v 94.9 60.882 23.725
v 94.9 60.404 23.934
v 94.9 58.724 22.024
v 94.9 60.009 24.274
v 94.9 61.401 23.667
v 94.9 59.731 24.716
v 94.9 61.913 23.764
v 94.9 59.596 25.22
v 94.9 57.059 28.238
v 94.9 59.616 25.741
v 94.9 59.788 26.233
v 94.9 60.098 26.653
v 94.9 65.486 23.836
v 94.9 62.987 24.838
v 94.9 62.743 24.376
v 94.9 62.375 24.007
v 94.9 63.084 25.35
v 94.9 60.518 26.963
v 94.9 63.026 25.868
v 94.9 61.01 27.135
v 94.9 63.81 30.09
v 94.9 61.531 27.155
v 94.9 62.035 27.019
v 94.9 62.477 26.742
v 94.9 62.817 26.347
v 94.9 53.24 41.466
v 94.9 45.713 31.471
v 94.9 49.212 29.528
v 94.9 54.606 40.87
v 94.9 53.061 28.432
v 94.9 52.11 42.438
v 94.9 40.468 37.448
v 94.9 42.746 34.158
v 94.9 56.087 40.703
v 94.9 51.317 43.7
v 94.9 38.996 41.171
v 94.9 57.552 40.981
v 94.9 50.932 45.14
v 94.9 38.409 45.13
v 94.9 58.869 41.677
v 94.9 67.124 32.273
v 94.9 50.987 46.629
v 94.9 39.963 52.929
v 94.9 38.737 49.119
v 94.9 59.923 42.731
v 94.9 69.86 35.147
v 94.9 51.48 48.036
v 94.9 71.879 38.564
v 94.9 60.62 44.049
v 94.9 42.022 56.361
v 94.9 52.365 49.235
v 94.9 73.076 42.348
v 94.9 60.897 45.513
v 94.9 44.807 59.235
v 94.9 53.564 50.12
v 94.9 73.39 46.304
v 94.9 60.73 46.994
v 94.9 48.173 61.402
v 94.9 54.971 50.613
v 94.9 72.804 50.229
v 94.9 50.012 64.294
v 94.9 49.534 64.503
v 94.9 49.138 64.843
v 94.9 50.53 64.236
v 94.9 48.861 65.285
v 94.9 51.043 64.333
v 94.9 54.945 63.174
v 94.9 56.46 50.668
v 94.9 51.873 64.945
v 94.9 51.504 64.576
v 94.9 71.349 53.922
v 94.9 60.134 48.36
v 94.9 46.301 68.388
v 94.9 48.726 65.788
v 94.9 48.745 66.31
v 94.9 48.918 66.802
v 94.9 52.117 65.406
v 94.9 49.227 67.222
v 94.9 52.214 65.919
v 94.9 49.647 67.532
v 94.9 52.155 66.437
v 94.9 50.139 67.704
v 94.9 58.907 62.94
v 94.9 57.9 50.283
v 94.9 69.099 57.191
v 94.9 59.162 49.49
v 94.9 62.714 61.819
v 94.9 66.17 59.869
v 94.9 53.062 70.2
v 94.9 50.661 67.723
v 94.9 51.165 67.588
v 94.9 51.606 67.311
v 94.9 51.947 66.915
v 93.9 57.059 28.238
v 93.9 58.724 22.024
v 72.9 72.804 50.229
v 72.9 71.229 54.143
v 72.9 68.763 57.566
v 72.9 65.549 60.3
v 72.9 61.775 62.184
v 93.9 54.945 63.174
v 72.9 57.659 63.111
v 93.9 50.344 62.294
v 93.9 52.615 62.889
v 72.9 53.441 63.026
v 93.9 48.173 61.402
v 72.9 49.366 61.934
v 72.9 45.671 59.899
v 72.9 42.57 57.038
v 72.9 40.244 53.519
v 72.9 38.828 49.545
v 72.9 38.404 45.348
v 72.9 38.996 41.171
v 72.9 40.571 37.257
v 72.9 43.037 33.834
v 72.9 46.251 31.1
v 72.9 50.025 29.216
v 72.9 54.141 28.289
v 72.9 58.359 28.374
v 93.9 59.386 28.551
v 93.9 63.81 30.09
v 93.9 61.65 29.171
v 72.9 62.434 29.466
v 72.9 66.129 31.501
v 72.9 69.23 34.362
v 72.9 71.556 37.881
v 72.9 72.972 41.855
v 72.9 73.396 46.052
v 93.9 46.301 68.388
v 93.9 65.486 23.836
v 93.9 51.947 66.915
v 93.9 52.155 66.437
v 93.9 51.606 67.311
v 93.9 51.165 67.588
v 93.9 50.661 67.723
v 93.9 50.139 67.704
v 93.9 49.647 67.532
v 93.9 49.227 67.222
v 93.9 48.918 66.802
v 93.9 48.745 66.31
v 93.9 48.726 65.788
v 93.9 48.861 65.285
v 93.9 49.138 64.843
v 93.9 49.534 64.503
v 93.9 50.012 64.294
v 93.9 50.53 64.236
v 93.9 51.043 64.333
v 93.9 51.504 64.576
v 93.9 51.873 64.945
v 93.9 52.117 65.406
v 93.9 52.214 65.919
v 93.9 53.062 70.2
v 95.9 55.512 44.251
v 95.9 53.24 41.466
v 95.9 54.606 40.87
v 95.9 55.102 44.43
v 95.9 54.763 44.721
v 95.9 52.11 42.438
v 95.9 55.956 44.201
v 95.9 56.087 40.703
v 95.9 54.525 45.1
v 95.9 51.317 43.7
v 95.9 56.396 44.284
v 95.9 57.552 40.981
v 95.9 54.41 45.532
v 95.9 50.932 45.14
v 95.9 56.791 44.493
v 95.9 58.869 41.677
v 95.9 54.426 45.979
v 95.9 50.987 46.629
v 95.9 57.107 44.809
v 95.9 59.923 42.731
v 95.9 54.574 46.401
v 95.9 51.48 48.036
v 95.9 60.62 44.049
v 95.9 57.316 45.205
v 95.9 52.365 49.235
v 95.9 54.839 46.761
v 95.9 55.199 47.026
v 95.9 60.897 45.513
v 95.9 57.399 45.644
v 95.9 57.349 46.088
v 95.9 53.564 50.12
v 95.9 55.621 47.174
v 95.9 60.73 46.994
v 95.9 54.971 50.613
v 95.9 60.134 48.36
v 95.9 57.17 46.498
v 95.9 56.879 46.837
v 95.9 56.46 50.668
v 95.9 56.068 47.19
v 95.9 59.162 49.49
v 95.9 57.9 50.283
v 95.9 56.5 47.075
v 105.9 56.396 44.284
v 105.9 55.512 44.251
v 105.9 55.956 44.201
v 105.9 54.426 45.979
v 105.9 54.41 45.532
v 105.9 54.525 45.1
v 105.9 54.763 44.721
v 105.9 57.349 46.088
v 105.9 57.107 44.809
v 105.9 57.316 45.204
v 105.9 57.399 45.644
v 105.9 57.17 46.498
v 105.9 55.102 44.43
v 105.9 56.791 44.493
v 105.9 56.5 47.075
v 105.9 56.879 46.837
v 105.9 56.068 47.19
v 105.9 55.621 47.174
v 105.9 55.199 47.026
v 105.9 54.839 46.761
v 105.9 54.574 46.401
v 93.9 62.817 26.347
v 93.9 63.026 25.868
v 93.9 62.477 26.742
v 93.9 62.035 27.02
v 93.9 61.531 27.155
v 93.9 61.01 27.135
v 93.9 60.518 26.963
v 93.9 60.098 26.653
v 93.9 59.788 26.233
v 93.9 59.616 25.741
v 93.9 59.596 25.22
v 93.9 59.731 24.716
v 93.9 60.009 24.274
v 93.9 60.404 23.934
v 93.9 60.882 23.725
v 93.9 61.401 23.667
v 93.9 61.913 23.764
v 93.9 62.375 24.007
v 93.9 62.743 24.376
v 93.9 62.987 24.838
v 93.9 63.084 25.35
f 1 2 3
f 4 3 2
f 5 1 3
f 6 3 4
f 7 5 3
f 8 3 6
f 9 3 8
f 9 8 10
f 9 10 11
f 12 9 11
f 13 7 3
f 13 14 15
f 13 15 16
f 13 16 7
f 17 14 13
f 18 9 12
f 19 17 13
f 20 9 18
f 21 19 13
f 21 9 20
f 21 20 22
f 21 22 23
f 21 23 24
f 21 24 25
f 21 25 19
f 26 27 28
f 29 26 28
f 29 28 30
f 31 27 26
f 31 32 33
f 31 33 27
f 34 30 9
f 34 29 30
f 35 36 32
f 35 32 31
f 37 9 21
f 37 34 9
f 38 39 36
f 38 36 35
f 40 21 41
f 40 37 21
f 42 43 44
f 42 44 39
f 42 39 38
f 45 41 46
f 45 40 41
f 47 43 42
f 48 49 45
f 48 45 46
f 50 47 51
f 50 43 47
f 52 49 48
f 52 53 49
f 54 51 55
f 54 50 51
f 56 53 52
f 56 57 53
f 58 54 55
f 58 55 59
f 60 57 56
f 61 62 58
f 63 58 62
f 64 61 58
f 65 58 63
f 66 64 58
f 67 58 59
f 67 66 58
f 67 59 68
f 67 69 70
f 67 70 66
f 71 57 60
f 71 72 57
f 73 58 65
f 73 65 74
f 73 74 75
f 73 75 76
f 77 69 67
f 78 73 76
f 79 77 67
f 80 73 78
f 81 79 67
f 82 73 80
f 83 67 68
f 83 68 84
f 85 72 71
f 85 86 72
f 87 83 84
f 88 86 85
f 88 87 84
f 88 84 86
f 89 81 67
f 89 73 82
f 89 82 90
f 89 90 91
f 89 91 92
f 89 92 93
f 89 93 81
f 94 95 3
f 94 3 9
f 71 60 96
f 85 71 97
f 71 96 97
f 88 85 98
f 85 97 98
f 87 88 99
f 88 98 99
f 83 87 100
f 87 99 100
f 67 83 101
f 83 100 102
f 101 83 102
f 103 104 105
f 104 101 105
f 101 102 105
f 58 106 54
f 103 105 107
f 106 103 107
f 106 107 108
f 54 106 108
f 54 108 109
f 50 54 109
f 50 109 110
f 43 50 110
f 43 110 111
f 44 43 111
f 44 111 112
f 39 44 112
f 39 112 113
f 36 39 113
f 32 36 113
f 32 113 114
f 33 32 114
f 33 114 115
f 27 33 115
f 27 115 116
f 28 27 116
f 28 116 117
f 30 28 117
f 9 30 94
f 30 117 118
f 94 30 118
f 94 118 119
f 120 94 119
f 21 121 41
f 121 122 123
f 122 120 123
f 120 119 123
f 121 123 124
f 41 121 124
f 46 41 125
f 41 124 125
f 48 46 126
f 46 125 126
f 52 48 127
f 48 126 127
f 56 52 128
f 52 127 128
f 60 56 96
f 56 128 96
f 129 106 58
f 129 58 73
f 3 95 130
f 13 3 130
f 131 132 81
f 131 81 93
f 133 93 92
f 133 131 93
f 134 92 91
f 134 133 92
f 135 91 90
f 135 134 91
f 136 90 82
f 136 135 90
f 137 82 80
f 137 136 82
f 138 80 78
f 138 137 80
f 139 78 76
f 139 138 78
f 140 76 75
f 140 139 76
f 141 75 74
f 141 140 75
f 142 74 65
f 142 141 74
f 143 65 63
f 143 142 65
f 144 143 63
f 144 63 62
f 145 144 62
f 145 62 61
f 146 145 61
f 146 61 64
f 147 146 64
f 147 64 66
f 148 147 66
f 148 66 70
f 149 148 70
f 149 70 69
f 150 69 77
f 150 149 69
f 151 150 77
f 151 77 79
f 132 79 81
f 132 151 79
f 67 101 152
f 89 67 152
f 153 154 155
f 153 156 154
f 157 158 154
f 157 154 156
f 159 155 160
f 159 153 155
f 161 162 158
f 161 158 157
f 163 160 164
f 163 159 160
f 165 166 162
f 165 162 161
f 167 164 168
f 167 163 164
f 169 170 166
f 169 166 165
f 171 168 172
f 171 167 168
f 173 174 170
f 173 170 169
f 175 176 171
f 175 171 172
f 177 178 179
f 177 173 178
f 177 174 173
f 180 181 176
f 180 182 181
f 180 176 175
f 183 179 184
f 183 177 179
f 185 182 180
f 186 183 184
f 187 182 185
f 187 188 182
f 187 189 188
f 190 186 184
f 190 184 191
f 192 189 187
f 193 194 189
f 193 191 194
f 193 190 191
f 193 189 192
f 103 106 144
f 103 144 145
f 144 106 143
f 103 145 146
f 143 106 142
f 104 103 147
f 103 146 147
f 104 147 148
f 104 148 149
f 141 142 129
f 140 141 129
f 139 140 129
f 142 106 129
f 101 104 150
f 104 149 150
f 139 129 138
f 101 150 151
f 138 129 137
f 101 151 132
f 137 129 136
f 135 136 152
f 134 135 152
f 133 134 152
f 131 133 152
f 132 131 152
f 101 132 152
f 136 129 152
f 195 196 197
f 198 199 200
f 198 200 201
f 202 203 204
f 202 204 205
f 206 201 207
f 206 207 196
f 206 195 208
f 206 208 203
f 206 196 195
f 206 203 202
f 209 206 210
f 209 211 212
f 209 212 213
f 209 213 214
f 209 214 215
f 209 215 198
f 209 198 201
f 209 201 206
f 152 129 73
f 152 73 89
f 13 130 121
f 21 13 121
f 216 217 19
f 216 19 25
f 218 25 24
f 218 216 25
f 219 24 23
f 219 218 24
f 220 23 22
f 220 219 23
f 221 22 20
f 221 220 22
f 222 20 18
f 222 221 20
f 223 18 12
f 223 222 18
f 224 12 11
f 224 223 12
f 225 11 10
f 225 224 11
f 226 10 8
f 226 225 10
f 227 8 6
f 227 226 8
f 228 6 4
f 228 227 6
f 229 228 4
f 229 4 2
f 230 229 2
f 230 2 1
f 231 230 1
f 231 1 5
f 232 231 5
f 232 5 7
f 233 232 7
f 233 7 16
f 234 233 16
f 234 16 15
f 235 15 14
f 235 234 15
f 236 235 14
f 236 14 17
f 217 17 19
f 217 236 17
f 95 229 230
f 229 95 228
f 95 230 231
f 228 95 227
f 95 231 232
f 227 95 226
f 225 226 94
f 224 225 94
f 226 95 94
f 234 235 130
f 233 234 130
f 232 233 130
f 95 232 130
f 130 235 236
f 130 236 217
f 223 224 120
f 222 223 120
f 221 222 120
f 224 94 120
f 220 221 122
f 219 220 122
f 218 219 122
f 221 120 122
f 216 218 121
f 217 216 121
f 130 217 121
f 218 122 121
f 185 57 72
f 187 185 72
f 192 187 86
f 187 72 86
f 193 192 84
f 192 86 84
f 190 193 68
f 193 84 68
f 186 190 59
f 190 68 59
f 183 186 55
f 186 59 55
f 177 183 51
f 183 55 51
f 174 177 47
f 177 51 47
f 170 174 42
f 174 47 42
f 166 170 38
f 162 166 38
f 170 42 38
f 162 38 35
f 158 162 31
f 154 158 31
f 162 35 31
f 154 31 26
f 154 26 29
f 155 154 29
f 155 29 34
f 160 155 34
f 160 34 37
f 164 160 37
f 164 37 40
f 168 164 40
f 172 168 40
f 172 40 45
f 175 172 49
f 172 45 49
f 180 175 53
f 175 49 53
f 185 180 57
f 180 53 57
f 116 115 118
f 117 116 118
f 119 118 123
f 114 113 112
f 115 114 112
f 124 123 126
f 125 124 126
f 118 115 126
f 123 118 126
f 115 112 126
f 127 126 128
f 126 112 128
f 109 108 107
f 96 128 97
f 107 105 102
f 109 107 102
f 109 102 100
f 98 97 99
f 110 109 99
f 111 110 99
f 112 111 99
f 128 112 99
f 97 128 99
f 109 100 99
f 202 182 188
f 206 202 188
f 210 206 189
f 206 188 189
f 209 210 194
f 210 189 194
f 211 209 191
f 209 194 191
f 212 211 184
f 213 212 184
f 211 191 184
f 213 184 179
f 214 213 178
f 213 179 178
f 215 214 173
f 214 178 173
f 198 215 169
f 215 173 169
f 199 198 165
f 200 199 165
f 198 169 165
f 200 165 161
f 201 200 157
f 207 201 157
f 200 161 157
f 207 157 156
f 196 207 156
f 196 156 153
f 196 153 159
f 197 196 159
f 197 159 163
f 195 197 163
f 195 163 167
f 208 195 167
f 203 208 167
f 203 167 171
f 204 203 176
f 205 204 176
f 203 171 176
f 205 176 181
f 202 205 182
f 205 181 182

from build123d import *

# Parameters (mm, degrees)
CYLINDER129_R             = 1.75
CYLINDER129_DEPTH         = 26
CYLINDER131_R             = 1.75
CYLINDER131_DEPTH         = 26
BOX066_W                  = 7
BOX066_H                  = 48
BOX066_DEPTH              = 1
CYLINDER132_R             = 1.5
CYLINDER132_DEPTH         = 10
CYLINDER130_R             = 5
CYLINDER130_DEPTH         = 1
CYLINDER128_R             = 17.5
CYLINDER128_DEPTH         = 22
FUSION092_ROLL_ANGLE      = 90.000203
FUSION092_PITCH_ANGLE     = -15.000283
FUSION092_PLACEMENT_ANGLE = 90.000203


with BuildPart() as cylinder129:
    # Cylinder129 → Cylinder129 (new body)
    with BuildSketch(Plane(origin=(0, 21, 0), x_dir=(1, 0, 0), z_dir=(0, 0, 1))):
        Circle(CYLINDER129_R)
    extrude(amount=CYLINDER129_DEPTH)


with BuildPart() as cylinder131:
    # Cylinder131 → Cylinder131 (new body)
    with BuildSketch(Plane(origin=(0, -21, 0), x_dir=(1, 0, 0), z_dir=(0, 0, 1))):
        Circle(CYLINDER131_R)
    extrude(amount=CYLINDER131_DEPTH)


with BuildPart() as cut183:
    # Box066 → Box066 (new body)
    with BuildSketch(Plane(origin=(-3.4, -23.6, 22), x_dir=(1, 0, 0), z_dir=(0, 0, 1))):
        with Locations((3.5, 24)):
            Rectangle(BOX066_W, BOX066_H)
    extrude(amount=BOX066_DEPTH)

    # Cut182: cut Cylinder131
    add(cylinder131.part, mode=Mode.SUBTRACT)

    # Cut183: cut Cylinder129
    add(cylinder129.part, mode=Mode.SUBTRACT)


with BuildPart() as cut183_1:
    # Cut183 placement: moved
    add(cut183.part.moved(Location((0, 0, -1))))


with BuildPart() as cylinder132:
    # Cylinder132 → Cylinder132 (new body)
    with BuildSketch(Plane.XY.offset(23)):
        Circle(CYLINDER132_R)
    extrude(amount=CYLINDER132_DEPTH)


with BuildPart() as cylinder130:
    # Cylinder130 → Cylinder130 (new body)
    with BuildSketch(Plane.XY.offset(22)):
        Circle(CYLINDER130_R)
    extrude(amount=CYLINDER130_DEPTH)


with BuildPart() as fusion092:
    # Cylinder128 → Cylinder128 (new body)
    with BuildSketch(Plane.XY):
        Circle(CYLINDER128_R)
    extrude(amount=CYLINDER128_DEPTH)

    # Fusion092: union Cut183, Cylinder132, Cylinder130
    add(cut183_1.part)
    add(cylinder132.part)
    add(cylinder130.part)


with BuildPart() as fusion092_1:
    # Fusion092 roll: moved
    add(fusion092.part.rotate(Axis((0, 0, 0), (1, 0, 0)), FUSION092_ROLL_ANGLE))


with BuildPart() as fusion092_2:
    # Fusion092 pitch: moved
    add(fusion092_1.part.rotate(Axis((0, 0, 0), (0, 1, 0)), FUSION092_PITCH_ANGLE))


with BuildPart() as fusion092_3:
    # Fusion092 placement: moved
    add(fusion092_2.part.moved(Location((72.9, 55.9, 45.7))).rotate(Axis((72.9, 55.9, 45.7), (0, 0, 1)), FUSION092_PLACEMENT_ANGLE))


solid = fusion092_3.part
